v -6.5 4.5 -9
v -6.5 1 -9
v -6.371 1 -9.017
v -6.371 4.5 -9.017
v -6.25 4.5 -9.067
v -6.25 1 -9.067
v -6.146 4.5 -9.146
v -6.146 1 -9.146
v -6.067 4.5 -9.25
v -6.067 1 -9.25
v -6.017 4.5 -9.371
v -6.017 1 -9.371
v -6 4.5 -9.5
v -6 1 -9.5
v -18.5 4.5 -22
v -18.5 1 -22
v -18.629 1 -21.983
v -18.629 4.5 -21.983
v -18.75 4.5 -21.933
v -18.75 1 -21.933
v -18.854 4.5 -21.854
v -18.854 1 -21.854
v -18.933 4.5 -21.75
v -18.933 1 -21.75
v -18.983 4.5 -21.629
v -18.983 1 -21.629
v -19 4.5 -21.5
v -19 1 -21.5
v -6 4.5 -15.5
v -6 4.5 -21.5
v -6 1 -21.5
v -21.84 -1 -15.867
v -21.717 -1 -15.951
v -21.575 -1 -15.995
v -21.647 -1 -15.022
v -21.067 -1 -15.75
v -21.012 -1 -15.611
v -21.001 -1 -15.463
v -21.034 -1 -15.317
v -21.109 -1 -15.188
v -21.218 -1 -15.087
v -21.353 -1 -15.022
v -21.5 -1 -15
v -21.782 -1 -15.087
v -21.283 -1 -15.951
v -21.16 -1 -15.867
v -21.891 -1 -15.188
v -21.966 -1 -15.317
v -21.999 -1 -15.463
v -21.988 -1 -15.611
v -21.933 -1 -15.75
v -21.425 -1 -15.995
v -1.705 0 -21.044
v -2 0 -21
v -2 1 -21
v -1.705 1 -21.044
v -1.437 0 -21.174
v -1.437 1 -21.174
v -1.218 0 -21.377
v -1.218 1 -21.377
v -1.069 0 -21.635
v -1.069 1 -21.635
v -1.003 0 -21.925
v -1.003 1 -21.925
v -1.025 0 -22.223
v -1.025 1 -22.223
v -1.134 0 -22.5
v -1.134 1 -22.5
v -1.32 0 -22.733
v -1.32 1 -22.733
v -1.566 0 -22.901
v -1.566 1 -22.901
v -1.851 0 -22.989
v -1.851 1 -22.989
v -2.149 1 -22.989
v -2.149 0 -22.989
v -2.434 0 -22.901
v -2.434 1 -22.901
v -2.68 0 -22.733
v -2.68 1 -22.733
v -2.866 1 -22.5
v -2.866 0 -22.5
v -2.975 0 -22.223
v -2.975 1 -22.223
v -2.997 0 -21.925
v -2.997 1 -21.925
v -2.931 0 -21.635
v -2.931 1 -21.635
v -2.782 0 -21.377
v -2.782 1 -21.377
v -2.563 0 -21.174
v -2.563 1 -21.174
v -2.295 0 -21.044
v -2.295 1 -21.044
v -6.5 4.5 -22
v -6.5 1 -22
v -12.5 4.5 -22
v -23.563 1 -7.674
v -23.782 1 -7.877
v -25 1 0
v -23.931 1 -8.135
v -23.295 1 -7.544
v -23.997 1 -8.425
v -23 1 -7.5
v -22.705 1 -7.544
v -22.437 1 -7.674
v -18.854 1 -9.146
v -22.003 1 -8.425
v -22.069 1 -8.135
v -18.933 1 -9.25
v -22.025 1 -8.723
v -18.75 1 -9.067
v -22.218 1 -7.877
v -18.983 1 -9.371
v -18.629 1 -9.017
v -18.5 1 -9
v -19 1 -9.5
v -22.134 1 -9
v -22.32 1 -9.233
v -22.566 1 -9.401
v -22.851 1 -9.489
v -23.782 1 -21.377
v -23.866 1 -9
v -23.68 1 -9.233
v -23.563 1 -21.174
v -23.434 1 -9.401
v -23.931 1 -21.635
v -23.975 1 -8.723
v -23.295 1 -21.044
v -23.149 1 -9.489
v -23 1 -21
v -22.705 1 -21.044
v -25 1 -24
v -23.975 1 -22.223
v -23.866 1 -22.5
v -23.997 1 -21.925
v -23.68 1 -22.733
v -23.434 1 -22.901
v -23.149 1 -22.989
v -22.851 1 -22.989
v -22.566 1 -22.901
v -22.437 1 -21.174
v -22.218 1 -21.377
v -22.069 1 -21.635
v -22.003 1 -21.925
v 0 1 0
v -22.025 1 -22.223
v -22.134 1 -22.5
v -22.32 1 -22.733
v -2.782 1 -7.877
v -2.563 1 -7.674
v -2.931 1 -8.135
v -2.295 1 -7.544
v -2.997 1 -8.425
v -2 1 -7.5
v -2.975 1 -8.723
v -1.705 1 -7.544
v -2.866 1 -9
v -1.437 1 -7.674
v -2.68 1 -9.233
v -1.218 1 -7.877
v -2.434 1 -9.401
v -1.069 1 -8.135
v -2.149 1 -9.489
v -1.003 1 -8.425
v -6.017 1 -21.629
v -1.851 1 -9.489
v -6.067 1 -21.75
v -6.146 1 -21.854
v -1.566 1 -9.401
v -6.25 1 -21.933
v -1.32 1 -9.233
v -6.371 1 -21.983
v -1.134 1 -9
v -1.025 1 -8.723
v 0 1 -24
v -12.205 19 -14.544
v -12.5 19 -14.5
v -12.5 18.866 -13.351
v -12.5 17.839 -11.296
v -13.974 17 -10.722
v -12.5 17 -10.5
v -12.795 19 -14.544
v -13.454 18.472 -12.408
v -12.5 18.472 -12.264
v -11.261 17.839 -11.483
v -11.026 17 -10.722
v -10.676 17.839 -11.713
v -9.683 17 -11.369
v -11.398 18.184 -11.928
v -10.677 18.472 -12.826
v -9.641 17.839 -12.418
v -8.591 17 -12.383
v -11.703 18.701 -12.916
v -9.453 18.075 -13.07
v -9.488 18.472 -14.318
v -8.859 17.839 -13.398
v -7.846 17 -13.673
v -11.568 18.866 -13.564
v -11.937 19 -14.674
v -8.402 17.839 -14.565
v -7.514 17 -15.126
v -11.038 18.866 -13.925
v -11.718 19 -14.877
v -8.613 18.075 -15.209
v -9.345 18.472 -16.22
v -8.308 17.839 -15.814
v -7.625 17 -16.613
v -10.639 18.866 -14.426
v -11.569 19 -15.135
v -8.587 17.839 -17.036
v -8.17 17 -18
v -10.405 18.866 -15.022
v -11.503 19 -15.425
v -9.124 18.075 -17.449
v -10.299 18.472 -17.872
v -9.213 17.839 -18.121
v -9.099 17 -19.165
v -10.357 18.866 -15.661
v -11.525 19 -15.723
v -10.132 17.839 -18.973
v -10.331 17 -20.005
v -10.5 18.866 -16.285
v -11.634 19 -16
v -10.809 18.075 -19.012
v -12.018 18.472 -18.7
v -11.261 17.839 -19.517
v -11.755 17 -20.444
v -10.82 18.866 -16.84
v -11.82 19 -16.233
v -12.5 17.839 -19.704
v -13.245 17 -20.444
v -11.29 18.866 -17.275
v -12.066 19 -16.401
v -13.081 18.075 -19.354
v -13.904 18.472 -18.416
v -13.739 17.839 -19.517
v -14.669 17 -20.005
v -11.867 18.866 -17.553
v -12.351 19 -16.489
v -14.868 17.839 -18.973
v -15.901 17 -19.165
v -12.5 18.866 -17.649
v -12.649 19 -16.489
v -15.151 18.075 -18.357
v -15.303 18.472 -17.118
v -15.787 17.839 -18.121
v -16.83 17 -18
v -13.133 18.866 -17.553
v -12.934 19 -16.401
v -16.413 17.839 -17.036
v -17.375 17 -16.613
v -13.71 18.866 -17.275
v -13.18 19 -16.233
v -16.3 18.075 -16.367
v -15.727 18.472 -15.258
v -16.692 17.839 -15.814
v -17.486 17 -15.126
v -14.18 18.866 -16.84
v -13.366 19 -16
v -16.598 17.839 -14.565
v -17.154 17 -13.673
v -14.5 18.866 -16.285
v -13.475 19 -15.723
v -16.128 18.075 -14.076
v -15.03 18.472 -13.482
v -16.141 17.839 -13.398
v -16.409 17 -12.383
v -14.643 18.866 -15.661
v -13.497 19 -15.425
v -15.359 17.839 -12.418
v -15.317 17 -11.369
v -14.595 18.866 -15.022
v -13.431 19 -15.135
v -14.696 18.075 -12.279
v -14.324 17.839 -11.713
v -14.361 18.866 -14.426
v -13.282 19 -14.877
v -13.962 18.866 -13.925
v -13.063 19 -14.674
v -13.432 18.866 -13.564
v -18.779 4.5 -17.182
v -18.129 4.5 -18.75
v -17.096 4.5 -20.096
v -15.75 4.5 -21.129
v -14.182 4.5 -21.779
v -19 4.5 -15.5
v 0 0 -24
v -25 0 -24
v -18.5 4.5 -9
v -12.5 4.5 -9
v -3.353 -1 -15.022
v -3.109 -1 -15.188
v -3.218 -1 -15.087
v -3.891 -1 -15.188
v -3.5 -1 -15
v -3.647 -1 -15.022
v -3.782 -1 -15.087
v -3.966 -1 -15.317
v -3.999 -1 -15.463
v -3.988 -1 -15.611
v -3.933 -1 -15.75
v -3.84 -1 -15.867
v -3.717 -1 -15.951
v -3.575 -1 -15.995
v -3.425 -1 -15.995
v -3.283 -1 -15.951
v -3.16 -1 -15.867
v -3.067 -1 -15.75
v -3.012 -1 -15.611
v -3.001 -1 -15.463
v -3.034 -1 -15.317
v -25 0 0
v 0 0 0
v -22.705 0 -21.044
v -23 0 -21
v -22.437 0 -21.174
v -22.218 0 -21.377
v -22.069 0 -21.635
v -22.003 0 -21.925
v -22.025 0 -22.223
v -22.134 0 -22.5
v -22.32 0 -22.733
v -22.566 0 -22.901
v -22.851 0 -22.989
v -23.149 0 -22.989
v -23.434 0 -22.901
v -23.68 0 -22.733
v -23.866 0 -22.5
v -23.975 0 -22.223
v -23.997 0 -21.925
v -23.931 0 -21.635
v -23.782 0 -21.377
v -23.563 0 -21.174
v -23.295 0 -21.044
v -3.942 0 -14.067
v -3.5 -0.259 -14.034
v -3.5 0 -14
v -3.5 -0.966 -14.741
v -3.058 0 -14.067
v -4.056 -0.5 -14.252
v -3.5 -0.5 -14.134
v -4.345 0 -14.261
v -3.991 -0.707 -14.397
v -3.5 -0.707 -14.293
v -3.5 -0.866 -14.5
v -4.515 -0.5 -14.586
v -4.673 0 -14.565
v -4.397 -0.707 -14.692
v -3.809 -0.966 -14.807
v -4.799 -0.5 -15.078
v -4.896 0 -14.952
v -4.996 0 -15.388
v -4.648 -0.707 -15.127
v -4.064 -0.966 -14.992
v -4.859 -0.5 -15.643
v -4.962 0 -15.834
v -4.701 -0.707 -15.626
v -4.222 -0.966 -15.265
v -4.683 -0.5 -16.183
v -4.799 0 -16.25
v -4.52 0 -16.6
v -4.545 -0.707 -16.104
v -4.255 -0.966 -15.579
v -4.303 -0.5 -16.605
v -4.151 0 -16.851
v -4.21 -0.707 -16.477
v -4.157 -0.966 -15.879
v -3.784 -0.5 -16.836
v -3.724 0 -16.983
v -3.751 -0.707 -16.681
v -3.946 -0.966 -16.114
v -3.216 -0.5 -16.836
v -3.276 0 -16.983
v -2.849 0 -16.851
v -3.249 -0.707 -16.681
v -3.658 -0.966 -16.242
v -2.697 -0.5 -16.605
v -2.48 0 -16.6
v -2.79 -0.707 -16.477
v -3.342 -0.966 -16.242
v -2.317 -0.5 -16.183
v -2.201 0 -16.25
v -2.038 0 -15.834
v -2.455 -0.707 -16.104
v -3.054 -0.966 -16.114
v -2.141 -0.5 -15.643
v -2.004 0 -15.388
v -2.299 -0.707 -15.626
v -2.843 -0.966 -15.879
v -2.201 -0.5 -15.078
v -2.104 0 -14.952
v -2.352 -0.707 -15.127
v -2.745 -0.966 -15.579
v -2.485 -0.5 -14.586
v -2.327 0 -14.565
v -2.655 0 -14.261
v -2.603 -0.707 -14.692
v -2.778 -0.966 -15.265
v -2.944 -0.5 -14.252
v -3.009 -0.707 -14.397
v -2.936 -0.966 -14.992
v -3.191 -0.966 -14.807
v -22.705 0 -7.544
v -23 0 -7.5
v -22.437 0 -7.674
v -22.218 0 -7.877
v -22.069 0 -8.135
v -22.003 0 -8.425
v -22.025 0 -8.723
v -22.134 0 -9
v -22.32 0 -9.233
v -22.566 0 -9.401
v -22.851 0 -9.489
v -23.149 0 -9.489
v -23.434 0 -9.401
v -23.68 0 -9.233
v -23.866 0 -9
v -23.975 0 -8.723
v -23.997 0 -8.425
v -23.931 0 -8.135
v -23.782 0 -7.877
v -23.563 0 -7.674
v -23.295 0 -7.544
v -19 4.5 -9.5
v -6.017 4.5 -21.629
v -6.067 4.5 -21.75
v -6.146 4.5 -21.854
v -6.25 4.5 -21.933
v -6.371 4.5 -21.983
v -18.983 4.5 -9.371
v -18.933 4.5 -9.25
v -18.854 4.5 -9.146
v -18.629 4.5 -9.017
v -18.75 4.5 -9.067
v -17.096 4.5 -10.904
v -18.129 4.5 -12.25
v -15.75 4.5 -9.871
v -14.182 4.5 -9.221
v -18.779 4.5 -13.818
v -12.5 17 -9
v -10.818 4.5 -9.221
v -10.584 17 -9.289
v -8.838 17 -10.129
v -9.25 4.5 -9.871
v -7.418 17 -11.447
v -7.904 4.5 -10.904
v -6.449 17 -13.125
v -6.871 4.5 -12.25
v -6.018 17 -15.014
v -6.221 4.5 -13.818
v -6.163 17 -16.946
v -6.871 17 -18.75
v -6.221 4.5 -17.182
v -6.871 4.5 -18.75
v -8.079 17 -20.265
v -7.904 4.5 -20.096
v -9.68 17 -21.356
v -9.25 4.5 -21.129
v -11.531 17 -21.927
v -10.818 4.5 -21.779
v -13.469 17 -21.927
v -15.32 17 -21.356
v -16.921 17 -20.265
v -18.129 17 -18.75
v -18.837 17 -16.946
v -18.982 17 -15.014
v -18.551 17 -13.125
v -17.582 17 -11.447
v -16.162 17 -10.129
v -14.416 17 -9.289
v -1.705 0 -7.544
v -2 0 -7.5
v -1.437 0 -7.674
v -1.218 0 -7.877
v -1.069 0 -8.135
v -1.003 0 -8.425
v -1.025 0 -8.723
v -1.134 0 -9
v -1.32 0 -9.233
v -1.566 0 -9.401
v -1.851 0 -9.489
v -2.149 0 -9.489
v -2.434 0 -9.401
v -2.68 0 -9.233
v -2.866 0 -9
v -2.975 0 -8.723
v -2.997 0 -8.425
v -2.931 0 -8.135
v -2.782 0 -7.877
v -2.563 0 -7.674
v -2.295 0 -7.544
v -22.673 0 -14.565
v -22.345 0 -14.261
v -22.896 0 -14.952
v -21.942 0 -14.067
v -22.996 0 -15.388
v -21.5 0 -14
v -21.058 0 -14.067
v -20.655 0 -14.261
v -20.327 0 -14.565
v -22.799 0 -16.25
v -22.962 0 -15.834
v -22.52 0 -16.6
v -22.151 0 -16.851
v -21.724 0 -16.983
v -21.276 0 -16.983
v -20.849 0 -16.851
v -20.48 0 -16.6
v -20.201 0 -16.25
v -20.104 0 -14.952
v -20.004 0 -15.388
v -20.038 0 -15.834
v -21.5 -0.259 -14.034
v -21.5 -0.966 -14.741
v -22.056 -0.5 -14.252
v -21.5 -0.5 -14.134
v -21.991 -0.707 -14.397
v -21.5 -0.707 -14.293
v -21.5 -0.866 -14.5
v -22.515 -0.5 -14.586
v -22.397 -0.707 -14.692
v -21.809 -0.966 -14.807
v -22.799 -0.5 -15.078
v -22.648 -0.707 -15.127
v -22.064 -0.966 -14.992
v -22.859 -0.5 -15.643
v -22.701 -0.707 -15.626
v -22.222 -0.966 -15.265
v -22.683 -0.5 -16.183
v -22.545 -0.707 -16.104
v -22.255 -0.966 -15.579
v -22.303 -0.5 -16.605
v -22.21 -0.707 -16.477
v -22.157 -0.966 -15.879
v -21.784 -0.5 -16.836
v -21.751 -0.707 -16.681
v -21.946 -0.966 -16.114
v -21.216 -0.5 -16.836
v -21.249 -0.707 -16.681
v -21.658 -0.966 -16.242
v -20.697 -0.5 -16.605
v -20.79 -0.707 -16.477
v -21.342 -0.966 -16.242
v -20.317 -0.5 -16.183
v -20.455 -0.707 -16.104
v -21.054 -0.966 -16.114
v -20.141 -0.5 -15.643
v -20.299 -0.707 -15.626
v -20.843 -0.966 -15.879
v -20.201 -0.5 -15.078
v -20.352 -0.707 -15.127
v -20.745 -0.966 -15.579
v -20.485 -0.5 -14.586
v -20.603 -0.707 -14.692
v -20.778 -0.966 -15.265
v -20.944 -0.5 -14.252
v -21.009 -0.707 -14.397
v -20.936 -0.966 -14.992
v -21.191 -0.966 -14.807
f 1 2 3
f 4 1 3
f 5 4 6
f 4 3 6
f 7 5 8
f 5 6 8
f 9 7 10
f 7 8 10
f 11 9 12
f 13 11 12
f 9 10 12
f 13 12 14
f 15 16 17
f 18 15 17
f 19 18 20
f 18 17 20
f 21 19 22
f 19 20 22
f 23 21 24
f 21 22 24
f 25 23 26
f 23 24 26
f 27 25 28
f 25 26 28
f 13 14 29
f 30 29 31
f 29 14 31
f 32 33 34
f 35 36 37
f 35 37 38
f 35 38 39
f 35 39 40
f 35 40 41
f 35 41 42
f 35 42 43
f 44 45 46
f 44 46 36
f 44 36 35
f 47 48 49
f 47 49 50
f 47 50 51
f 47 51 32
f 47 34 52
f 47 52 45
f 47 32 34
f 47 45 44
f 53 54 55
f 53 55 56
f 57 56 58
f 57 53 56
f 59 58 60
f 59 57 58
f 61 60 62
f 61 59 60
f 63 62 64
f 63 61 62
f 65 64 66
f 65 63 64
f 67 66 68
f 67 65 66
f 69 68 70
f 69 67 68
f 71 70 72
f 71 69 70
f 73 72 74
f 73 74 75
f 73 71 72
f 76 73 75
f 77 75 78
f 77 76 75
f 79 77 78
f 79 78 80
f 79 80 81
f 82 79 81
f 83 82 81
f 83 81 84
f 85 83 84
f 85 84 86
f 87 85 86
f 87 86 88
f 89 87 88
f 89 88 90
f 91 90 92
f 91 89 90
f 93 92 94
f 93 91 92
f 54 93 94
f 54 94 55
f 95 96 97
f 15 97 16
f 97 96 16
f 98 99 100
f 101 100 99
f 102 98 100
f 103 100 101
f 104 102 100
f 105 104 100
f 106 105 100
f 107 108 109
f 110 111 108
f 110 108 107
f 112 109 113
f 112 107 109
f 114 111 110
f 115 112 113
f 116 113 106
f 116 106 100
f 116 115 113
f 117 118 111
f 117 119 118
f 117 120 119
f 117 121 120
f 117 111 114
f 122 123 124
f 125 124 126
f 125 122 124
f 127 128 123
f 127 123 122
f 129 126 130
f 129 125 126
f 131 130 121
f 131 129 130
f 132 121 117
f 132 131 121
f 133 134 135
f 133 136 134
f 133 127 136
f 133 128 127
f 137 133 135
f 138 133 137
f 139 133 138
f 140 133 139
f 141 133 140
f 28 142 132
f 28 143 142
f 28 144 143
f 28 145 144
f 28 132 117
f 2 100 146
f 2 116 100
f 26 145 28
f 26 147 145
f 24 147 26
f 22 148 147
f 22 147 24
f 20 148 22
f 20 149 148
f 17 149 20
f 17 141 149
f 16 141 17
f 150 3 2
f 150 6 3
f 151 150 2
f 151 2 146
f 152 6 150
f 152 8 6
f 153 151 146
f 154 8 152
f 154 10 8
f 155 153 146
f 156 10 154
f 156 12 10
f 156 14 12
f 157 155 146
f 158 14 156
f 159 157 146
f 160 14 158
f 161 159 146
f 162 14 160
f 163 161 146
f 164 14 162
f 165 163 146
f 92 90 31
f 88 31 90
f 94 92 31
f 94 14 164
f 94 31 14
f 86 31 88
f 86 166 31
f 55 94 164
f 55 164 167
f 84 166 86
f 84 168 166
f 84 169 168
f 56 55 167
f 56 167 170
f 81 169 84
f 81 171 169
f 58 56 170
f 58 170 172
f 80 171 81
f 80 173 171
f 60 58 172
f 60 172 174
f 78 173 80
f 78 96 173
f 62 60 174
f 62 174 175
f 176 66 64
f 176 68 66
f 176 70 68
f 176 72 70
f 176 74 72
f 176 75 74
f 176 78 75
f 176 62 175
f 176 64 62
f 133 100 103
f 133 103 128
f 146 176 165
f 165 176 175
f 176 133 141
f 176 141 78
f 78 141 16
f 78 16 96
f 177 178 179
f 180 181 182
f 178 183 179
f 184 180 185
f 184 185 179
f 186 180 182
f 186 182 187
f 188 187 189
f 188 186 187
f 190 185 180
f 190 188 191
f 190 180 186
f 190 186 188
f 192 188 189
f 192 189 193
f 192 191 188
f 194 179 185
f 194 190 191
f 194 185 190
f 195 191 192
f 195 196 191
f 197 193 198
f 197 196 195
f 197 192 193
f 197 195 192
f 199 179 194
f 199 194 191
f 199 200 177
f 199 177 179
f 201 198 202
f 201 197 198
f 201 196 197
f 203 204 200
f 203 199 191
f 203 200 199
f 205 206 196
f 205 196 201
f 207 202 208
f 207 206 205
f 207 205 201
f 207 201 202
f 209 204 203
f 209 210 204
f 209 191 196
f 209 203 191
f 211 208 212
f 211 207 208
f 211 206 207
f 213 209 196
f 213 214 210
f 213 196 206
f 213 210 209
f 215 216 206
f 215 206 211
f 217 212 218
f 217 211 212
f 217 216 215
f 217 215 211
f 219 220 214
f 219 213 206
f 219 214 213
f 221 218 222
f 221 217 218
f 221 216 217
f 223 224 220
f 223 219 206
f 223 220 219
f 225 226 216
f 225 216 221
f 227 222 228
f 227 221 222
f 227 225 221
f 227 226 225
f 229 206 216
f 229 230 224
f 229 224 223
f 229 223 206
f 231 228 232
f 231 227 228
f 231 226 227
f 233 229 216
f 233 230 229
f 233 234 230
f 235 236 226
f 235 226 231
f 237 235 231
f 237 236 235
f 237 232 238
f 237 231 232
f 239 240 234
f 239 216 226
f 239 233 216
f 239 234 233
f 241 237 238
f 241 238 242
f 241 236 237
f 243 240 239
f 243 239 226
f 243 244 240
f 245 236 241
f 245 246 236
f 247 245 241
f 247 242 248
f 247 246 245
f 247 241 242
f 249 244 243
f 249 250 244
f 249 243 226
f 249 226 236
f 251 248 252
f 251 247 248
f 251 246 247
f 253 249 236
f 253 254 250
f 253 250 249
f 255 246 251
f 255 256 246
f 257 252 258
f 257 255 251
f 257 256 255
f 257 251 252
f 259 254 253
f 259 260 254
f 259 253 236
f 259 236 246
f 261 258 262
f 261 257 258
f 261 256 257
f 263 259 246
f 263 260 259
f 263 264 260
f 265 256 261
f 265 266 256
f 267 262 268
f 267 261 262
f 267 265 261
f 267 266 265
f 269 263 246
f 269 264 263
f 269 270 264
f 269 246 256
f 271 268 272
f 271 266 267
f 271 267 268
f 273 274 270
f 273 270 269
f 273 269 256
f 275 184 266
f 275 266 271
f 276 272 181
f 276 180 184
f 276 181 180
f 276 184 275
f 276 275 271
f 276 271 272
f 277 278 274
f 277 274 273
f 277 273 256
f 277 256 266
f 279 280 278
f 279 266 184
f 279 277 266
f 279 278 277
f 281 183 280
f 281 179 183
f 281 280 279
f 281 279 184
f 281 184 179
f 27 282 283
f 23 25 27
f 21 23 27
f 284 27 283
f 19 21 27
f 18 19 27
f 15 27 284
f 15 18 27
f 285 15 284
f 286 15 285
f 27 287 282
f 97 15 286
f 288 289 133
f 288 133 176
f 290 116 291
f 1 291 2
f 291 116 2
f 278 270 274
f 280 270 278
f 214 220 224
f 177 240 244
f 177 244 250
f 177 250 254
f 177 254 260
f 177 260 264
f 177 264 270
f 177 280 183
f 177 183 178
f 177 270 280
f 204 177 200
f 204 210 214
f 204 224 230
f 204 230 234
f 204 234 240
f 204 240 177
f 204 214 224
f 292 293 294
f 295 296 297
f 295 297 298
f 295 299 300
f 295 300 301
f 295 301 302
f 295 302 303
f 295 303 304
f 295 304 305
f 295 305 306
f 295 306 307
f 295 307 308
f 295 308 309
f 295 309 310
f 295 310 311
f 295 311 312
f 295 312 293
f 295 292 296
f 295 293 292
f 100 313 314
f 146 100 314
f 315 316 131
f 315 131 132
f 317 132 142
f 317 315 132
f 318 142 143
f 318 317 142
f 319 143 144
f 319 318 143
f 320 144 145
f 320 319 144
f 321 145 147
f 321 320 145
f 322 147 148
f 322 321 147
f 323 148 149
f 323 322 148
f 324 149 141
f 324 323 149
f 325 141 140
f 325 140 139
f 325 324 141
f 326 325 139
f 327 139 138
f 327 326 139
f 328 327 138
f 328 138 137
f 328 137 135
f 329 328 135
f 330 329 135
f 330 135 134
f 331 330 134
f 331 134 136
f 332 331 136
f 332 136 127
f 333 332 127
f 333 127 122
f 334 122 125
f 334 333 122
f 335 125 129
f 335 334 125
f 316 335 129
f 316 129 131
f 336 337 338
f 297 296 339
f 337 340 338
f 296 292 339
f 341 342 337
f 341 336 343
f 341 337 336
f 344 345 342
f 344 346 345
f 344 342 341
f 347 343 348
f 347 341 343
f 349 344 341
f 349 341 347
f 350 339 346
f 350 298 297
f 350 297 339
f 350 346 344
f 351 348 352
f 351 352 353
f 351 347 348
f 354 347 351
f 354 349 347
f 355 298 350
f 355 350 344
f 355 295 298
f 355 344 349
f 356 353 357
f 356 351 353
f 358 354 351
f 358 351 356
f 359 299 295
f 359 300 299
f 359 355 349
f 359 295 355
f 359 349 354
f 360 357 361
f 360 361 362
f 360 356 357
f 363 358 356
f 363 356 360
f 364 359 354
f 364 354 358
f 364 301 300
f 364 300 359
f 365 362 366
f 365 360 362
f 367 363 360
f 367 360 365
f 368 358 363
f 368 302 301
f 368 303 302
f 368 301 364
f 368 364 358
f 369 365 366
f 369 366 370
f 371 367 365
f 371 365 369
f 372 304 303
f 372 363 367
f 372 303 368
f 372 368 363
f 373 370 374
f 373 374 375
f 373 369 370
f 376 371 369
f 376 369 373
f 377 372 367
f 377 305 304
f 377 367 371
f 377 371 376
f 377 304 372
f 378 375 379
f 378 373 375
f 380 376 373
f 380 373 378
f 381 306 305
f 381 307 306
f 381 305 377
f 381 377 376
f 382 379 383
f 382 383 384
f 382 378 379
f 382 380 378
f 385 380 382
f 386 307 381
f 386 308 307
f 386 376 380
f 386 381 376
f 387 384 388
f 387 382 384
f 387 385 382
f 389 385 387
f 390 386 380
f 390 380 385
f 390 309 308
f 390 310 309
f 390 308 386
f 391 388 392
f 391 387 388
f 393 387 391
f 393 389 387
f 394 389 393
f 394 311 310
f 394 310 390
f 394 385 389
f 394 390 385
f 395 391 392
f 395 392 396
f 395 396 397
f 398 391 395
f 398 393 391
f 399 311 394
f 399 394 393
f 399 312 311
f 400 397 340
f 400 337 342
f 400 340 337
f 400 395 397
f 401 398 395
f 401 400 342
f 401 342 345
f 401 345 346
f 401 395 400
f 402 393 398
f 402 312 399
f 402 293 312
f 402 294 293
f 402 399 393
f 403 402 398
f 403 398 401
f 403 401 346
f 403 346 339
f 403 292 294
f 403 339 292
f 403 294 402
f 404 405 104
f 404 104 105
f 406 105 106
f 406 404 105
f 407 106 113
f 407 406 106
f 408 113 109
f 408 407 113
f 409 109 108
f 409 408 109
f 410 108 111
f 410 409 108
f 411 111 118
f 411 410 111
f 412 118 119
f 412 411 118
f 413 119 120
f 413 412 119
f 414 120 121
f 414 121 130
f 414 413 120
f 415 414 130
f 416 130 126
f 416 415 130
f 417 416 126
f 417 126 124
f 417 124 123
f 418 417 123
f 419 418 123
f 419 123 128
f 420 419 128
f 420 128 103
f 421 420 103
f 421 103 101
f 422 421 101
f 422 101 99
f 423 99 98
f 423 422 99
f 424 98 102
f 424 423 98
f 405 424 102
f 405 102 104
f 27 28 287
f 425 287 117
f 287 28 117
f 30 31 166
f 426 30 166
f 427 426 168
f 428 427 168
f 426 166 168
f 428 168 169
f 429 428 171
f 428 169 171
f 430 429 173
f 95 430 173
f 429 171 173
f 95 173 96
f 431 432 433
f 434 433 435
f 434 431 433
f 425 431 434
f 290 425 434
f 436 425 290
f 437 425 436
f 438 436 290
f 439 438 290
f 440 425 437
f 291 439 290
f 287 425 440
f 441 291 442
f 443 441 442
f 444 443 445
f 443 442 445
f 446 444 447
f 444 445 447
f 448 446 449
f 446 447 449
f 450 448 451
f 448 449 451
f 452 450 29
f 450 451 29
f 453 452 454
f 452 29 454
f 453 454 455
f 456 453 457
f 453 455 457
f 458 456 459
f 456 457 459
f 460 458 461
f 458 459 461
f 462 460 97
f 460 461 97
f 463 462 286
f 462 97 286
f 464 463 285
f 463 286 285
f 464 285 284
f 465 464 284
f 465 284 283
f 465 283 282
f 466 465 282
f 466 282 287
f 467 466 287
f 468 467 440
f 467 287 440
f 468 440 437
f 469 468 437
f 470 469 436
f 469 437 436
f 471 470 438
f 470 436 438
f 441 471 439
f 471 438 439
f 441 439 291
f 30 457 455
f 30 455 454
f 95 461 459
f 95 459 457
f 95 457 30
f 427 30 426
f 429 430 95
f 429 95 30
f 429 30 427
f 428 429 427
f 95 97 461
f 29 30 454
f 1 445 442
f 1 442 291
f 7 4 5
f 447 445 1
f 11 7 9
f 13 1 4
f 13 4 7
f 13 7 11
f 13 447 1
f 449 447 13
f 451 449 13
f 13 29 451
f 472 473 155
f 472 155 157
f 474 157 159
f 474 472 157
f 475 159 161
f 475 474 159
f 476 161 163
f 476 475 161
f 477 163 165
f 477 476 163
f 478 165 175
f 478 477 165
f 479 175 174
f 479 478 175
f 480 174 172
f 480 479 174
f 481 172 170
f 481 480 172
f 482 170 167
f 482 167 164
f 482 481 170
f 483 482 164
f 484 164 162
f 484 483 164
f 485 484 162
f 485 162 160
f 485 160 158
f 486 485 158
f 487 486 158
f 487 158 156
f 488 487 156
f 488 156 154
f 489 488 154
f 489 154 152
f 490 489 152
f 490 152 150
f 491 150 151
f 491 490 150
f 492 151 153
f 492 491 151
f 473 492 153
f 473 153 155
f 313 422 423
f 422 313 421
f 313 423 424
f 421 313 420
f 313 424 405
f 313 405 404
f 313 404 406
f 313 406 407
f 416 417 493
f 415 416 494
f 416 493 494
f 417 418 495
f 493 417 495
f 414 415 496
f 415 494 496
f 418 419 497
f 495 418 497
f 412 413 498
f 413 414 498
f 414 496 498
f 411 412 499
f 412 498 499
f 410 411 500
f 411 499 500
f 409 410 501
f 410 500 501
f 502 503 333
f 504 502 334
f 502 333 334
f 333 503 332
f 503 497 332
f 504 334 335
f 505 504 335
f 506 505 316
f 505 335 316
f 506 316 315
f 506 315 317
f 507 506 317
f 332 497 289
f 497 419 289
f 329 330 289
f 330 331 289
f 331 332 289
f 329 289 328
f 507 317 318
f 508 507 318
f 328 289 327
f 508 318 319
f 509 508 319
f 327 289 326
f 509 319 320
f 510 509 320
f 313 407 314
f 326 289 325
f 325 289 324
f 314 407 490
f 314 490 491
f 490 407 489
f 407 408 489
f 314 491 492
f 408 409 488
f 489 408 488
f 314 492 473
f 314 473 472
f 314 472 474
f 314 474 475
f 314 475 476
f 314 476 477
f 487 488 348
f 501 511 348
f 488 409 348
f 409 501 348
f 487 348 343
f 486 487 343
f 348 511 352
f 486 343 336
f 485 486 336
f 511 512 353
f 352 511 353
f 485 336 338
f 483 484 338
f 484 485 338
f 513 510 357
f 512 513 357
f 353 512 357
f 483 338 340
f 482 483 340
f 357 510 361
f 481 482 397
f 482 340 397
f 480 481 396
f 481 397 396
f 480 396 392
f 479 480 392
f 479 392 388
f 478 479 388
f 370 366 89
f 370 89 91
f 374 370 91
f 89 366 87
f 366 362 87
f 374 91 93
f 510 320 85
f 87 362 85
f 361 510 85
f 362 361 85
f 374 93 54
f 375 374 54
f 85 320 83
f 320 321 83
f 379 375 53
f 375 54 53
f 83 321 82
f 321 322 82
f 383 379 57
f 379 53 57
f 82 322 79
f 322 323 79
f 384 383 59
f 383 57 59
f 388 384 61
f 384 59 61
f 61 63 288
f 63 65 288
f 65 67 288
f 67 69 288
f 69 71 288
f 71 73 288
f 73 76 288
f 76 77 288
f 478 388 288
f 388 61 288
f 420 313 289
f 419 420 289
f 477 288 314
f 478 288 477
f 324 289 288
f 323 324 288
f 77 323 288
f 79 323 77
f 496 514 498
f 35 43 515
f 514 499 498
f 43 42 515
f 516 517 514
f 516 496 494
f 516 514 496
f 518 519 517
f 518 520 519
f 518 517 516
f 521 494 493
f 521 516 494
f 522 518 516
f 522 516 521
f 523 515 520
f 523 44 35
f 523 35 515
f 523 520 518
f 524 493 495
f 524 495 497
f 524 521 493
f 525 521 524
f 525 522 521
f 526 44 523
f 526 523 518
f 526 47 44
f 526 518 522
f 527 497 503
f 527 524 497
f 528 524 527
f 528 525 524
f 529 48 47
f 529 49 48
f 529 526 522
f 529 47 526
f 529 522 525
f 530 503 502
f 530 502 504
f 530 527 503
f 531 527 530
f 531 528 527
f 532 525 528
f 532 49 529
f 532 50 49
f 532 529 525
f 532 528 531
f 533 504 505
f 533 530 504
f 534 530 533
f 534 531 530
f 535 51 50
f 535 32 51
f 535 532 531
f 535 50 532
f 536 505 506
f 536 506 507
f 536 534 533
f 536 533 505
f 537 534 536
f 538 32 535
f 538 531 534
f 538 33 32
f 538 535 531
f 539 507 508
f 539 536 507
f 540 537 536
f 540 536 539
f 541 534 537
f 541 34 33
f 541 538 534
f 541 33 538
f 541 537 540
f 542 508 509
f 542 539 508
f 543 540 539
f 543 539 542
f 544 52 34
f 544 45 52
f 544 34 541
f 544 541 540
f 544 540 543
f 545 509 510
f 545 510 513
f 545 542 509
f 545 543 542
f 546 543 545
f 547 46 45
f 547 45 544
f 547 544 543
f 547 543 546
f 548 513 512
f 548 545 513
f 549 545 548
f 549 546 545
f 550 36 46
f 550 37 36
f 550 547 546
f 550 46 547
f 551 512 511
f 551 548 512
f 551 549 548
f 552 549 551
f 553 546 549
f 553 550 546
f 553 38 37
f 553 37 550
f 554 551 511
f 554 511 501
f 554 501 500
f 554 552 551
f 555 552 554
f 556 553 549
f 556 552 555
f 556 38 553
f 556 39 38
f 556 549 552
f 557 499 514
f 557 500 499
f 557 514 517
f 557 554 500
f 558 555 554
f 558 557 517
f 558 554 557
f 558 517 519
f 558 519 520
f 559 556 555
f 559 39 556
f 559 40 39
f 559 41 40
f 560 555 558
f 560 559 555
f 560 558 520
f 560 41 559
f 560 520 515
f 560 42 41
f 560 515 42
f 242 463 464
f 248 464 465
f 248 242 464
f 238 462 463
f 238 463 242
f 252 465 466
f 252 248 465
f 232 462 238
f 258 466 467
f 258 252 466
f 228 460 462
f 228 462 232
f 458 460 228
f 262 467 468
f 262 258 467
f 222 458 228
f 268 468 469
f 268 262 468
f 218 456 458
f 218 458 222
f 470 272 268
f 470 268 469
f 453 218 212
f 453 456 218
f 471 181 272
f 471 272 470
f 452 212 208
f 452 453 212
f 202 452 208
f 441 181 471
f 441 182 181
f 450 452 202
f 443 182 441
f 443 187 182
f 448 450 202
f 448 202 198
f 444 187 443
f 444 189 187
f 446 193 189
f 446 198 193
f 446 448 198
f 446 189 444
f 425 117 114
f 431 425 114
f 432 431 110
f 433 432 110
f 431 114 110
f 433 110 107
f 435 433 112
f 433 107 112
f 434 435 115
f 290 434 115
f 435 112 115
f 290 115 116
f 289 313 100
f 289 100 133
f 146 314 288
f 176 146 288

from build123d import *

# Parameters (mm, degrees)
SKETCH_1_W      = 25
SKETCH_1_H      = 24
SKETCH_1_R      = 1
EXTRUDE_1_DEPTH = 1
SKETCH_3_R      = 6.5
EXTRUDE_4_DEPTH = 16
EXTRUDE_5_DEPTH = 3.5
SKETCH_5_R      = 5
EXTRUDE_6_DEPTH = 2
FILLET_1_R      = 5
SKETCH_10_R     = 1.5
EXTRUDE_7_DEPTH = 1
FILLET_2_R      = 1


# Some blends are built 0.0001 mm under size
with BuildPart() as part:
    # Эскиз1 → Бобышка-Вытянуть1 (new body)
    with BuildSketch(Plane(origin=(0, 0, 0), x_dir=(1, 0, 0), z_dir=(0, 1, 0))):
        with Locations((-12.5, 12)):
            Rectangle(SKETCH_1_W, SKETCH_1_H)
        with Locations(Location((-23, 22, 0), (0, 0, 270))):
            Circle(SKETCH_1_R, mode=Mode.SUBTRACT)
        with Locations(Location((-2, 22, 0), (0, 0, 270))):
            Circle(SKETCH_1_R, mode=Mode.SUBTRACT)
        with Locations(Location((-23, 8.5, 0), (0, 0, 270))):
            Circle(SKETCH_1_R, mode=Mode.SUBTRACT)
        with Locations(Location((-2, 8.5, 0), (0, 0, 270))):
            Circle(SKETCH_1_R, mode=Mode.SUBTRACT)
    extrude(amount=EXTRUDE_1_DEPTH)

    # Эскиз3 → Бобышка-Вытянуть4 (add)
    with BuildSketch(Plane(origin=(0, 1, 0), x_dir=(1, 0, 0), z_dir=(0, 1, 0))):
        with Locations(Location((-12.5, 15.5, 0), (0, 0, 270))):
            Circle(SKETCH_3_R)
    extrude(amount=EXTRUDE_4_DEPTH)

    # Эскиз3<5> → Бобышка-Вытянуть5 (add)
    with BuildSketch(Plane(origin=(0, 1, 0), x_dir=(1, 0, 0), z_dir=(0, 1, 0))):
        with BuildLine():
            Line((-19, 21.5), (-19, 9.5))
            ThreePointArc((-19, 9.5), (-18.853553391, 9.146446609), (-18.5, 9))
            Line((-18.5, 9), (-6.5, 9))
            ThreePointArc((-6.5, 9), (-6.146446609, 9.146446609), (-6, 9.5))
            Line((-6, 9.5), (-6, 21.5))
            ThreePointArc((-6, 21.5), (-6.146446609, 21.853553391), (-6.5, 22))
            Line((-6.5, 22), (-18.5, 22))
            ThreePointArc((-18.5, 22), (-18.853553391, 21.853553391), (-19, 21.5))
        make_face()
    extrude(amount=EXTRUDE_5_DEPTH)

    # Эскиз5 → Бобышка-Вытянуть6 (add)
    with BuildSketch(Plane(origin=(0, 17, 0), x_dir=(1, 0, 0), z_dir=(0, 1, 0))):
        with Locations(Location((-12.5, 15.5, 0), (0, 0, 270))):
            Circle(SKETCH_5_R)
    extrude(amount=EXTRUDE_6_DEPTH)

    # Скругление1
    # the kernel refuses this fillet: 5 mm, written as the material it takes off along each edge
    with BuildSketch(Plane(origin=(-12.5, 19, -15.5), x_dir=(0, 0, 1), z_dir=(-1, 0, 0))) as fillet_1_piece_1:
        with BuildLine():
            CenterArc((1, -5), FILLET_1_R, 36.869897646, 53.130102354)
            Line((1, 0), (1, 0.1))
            Line((1, 0.1), (5, 0.1))
            Line((5, 0.1), (5.1, 0))
            ThreePointArc((5.1, 0), (5.1, -1), (5.08, -1.94))
            Line((5.08, -1.94), (5, -2))
        make_face()
    revolve(axis=Axis((-12.5, 19, -15.5), (0, 1, 0)), mode=Mode.SUBTRACT)

    # Эскиз10 → Бобышка-Вытянуть7 (add)
    with BuildSketch(Plane.XZ):
        with Locations(Location((-21.5, -15.5, 0), (0, 0, 90))):
            Circle(SKETCH_10_R)
        with Locations(Location((-3.5, -15.5, 0), (0, 0, 90))):
            Circle(SKETCH_10_R)
    extrude(amount=EXTRUDE_7_DEPTH)

    # Скругление2
    fillet_2_edges = [part.edges().sort_by_distance(p)[0] for p in [
        (-21.5, -1, -17),
        (-3.5, -1, -17),
    ]]
    fillet(fillet_2_edges, radius=FILLET_2_R - 0.0001)  # a hair under: the kernel refuses the full size


solid = part.part
